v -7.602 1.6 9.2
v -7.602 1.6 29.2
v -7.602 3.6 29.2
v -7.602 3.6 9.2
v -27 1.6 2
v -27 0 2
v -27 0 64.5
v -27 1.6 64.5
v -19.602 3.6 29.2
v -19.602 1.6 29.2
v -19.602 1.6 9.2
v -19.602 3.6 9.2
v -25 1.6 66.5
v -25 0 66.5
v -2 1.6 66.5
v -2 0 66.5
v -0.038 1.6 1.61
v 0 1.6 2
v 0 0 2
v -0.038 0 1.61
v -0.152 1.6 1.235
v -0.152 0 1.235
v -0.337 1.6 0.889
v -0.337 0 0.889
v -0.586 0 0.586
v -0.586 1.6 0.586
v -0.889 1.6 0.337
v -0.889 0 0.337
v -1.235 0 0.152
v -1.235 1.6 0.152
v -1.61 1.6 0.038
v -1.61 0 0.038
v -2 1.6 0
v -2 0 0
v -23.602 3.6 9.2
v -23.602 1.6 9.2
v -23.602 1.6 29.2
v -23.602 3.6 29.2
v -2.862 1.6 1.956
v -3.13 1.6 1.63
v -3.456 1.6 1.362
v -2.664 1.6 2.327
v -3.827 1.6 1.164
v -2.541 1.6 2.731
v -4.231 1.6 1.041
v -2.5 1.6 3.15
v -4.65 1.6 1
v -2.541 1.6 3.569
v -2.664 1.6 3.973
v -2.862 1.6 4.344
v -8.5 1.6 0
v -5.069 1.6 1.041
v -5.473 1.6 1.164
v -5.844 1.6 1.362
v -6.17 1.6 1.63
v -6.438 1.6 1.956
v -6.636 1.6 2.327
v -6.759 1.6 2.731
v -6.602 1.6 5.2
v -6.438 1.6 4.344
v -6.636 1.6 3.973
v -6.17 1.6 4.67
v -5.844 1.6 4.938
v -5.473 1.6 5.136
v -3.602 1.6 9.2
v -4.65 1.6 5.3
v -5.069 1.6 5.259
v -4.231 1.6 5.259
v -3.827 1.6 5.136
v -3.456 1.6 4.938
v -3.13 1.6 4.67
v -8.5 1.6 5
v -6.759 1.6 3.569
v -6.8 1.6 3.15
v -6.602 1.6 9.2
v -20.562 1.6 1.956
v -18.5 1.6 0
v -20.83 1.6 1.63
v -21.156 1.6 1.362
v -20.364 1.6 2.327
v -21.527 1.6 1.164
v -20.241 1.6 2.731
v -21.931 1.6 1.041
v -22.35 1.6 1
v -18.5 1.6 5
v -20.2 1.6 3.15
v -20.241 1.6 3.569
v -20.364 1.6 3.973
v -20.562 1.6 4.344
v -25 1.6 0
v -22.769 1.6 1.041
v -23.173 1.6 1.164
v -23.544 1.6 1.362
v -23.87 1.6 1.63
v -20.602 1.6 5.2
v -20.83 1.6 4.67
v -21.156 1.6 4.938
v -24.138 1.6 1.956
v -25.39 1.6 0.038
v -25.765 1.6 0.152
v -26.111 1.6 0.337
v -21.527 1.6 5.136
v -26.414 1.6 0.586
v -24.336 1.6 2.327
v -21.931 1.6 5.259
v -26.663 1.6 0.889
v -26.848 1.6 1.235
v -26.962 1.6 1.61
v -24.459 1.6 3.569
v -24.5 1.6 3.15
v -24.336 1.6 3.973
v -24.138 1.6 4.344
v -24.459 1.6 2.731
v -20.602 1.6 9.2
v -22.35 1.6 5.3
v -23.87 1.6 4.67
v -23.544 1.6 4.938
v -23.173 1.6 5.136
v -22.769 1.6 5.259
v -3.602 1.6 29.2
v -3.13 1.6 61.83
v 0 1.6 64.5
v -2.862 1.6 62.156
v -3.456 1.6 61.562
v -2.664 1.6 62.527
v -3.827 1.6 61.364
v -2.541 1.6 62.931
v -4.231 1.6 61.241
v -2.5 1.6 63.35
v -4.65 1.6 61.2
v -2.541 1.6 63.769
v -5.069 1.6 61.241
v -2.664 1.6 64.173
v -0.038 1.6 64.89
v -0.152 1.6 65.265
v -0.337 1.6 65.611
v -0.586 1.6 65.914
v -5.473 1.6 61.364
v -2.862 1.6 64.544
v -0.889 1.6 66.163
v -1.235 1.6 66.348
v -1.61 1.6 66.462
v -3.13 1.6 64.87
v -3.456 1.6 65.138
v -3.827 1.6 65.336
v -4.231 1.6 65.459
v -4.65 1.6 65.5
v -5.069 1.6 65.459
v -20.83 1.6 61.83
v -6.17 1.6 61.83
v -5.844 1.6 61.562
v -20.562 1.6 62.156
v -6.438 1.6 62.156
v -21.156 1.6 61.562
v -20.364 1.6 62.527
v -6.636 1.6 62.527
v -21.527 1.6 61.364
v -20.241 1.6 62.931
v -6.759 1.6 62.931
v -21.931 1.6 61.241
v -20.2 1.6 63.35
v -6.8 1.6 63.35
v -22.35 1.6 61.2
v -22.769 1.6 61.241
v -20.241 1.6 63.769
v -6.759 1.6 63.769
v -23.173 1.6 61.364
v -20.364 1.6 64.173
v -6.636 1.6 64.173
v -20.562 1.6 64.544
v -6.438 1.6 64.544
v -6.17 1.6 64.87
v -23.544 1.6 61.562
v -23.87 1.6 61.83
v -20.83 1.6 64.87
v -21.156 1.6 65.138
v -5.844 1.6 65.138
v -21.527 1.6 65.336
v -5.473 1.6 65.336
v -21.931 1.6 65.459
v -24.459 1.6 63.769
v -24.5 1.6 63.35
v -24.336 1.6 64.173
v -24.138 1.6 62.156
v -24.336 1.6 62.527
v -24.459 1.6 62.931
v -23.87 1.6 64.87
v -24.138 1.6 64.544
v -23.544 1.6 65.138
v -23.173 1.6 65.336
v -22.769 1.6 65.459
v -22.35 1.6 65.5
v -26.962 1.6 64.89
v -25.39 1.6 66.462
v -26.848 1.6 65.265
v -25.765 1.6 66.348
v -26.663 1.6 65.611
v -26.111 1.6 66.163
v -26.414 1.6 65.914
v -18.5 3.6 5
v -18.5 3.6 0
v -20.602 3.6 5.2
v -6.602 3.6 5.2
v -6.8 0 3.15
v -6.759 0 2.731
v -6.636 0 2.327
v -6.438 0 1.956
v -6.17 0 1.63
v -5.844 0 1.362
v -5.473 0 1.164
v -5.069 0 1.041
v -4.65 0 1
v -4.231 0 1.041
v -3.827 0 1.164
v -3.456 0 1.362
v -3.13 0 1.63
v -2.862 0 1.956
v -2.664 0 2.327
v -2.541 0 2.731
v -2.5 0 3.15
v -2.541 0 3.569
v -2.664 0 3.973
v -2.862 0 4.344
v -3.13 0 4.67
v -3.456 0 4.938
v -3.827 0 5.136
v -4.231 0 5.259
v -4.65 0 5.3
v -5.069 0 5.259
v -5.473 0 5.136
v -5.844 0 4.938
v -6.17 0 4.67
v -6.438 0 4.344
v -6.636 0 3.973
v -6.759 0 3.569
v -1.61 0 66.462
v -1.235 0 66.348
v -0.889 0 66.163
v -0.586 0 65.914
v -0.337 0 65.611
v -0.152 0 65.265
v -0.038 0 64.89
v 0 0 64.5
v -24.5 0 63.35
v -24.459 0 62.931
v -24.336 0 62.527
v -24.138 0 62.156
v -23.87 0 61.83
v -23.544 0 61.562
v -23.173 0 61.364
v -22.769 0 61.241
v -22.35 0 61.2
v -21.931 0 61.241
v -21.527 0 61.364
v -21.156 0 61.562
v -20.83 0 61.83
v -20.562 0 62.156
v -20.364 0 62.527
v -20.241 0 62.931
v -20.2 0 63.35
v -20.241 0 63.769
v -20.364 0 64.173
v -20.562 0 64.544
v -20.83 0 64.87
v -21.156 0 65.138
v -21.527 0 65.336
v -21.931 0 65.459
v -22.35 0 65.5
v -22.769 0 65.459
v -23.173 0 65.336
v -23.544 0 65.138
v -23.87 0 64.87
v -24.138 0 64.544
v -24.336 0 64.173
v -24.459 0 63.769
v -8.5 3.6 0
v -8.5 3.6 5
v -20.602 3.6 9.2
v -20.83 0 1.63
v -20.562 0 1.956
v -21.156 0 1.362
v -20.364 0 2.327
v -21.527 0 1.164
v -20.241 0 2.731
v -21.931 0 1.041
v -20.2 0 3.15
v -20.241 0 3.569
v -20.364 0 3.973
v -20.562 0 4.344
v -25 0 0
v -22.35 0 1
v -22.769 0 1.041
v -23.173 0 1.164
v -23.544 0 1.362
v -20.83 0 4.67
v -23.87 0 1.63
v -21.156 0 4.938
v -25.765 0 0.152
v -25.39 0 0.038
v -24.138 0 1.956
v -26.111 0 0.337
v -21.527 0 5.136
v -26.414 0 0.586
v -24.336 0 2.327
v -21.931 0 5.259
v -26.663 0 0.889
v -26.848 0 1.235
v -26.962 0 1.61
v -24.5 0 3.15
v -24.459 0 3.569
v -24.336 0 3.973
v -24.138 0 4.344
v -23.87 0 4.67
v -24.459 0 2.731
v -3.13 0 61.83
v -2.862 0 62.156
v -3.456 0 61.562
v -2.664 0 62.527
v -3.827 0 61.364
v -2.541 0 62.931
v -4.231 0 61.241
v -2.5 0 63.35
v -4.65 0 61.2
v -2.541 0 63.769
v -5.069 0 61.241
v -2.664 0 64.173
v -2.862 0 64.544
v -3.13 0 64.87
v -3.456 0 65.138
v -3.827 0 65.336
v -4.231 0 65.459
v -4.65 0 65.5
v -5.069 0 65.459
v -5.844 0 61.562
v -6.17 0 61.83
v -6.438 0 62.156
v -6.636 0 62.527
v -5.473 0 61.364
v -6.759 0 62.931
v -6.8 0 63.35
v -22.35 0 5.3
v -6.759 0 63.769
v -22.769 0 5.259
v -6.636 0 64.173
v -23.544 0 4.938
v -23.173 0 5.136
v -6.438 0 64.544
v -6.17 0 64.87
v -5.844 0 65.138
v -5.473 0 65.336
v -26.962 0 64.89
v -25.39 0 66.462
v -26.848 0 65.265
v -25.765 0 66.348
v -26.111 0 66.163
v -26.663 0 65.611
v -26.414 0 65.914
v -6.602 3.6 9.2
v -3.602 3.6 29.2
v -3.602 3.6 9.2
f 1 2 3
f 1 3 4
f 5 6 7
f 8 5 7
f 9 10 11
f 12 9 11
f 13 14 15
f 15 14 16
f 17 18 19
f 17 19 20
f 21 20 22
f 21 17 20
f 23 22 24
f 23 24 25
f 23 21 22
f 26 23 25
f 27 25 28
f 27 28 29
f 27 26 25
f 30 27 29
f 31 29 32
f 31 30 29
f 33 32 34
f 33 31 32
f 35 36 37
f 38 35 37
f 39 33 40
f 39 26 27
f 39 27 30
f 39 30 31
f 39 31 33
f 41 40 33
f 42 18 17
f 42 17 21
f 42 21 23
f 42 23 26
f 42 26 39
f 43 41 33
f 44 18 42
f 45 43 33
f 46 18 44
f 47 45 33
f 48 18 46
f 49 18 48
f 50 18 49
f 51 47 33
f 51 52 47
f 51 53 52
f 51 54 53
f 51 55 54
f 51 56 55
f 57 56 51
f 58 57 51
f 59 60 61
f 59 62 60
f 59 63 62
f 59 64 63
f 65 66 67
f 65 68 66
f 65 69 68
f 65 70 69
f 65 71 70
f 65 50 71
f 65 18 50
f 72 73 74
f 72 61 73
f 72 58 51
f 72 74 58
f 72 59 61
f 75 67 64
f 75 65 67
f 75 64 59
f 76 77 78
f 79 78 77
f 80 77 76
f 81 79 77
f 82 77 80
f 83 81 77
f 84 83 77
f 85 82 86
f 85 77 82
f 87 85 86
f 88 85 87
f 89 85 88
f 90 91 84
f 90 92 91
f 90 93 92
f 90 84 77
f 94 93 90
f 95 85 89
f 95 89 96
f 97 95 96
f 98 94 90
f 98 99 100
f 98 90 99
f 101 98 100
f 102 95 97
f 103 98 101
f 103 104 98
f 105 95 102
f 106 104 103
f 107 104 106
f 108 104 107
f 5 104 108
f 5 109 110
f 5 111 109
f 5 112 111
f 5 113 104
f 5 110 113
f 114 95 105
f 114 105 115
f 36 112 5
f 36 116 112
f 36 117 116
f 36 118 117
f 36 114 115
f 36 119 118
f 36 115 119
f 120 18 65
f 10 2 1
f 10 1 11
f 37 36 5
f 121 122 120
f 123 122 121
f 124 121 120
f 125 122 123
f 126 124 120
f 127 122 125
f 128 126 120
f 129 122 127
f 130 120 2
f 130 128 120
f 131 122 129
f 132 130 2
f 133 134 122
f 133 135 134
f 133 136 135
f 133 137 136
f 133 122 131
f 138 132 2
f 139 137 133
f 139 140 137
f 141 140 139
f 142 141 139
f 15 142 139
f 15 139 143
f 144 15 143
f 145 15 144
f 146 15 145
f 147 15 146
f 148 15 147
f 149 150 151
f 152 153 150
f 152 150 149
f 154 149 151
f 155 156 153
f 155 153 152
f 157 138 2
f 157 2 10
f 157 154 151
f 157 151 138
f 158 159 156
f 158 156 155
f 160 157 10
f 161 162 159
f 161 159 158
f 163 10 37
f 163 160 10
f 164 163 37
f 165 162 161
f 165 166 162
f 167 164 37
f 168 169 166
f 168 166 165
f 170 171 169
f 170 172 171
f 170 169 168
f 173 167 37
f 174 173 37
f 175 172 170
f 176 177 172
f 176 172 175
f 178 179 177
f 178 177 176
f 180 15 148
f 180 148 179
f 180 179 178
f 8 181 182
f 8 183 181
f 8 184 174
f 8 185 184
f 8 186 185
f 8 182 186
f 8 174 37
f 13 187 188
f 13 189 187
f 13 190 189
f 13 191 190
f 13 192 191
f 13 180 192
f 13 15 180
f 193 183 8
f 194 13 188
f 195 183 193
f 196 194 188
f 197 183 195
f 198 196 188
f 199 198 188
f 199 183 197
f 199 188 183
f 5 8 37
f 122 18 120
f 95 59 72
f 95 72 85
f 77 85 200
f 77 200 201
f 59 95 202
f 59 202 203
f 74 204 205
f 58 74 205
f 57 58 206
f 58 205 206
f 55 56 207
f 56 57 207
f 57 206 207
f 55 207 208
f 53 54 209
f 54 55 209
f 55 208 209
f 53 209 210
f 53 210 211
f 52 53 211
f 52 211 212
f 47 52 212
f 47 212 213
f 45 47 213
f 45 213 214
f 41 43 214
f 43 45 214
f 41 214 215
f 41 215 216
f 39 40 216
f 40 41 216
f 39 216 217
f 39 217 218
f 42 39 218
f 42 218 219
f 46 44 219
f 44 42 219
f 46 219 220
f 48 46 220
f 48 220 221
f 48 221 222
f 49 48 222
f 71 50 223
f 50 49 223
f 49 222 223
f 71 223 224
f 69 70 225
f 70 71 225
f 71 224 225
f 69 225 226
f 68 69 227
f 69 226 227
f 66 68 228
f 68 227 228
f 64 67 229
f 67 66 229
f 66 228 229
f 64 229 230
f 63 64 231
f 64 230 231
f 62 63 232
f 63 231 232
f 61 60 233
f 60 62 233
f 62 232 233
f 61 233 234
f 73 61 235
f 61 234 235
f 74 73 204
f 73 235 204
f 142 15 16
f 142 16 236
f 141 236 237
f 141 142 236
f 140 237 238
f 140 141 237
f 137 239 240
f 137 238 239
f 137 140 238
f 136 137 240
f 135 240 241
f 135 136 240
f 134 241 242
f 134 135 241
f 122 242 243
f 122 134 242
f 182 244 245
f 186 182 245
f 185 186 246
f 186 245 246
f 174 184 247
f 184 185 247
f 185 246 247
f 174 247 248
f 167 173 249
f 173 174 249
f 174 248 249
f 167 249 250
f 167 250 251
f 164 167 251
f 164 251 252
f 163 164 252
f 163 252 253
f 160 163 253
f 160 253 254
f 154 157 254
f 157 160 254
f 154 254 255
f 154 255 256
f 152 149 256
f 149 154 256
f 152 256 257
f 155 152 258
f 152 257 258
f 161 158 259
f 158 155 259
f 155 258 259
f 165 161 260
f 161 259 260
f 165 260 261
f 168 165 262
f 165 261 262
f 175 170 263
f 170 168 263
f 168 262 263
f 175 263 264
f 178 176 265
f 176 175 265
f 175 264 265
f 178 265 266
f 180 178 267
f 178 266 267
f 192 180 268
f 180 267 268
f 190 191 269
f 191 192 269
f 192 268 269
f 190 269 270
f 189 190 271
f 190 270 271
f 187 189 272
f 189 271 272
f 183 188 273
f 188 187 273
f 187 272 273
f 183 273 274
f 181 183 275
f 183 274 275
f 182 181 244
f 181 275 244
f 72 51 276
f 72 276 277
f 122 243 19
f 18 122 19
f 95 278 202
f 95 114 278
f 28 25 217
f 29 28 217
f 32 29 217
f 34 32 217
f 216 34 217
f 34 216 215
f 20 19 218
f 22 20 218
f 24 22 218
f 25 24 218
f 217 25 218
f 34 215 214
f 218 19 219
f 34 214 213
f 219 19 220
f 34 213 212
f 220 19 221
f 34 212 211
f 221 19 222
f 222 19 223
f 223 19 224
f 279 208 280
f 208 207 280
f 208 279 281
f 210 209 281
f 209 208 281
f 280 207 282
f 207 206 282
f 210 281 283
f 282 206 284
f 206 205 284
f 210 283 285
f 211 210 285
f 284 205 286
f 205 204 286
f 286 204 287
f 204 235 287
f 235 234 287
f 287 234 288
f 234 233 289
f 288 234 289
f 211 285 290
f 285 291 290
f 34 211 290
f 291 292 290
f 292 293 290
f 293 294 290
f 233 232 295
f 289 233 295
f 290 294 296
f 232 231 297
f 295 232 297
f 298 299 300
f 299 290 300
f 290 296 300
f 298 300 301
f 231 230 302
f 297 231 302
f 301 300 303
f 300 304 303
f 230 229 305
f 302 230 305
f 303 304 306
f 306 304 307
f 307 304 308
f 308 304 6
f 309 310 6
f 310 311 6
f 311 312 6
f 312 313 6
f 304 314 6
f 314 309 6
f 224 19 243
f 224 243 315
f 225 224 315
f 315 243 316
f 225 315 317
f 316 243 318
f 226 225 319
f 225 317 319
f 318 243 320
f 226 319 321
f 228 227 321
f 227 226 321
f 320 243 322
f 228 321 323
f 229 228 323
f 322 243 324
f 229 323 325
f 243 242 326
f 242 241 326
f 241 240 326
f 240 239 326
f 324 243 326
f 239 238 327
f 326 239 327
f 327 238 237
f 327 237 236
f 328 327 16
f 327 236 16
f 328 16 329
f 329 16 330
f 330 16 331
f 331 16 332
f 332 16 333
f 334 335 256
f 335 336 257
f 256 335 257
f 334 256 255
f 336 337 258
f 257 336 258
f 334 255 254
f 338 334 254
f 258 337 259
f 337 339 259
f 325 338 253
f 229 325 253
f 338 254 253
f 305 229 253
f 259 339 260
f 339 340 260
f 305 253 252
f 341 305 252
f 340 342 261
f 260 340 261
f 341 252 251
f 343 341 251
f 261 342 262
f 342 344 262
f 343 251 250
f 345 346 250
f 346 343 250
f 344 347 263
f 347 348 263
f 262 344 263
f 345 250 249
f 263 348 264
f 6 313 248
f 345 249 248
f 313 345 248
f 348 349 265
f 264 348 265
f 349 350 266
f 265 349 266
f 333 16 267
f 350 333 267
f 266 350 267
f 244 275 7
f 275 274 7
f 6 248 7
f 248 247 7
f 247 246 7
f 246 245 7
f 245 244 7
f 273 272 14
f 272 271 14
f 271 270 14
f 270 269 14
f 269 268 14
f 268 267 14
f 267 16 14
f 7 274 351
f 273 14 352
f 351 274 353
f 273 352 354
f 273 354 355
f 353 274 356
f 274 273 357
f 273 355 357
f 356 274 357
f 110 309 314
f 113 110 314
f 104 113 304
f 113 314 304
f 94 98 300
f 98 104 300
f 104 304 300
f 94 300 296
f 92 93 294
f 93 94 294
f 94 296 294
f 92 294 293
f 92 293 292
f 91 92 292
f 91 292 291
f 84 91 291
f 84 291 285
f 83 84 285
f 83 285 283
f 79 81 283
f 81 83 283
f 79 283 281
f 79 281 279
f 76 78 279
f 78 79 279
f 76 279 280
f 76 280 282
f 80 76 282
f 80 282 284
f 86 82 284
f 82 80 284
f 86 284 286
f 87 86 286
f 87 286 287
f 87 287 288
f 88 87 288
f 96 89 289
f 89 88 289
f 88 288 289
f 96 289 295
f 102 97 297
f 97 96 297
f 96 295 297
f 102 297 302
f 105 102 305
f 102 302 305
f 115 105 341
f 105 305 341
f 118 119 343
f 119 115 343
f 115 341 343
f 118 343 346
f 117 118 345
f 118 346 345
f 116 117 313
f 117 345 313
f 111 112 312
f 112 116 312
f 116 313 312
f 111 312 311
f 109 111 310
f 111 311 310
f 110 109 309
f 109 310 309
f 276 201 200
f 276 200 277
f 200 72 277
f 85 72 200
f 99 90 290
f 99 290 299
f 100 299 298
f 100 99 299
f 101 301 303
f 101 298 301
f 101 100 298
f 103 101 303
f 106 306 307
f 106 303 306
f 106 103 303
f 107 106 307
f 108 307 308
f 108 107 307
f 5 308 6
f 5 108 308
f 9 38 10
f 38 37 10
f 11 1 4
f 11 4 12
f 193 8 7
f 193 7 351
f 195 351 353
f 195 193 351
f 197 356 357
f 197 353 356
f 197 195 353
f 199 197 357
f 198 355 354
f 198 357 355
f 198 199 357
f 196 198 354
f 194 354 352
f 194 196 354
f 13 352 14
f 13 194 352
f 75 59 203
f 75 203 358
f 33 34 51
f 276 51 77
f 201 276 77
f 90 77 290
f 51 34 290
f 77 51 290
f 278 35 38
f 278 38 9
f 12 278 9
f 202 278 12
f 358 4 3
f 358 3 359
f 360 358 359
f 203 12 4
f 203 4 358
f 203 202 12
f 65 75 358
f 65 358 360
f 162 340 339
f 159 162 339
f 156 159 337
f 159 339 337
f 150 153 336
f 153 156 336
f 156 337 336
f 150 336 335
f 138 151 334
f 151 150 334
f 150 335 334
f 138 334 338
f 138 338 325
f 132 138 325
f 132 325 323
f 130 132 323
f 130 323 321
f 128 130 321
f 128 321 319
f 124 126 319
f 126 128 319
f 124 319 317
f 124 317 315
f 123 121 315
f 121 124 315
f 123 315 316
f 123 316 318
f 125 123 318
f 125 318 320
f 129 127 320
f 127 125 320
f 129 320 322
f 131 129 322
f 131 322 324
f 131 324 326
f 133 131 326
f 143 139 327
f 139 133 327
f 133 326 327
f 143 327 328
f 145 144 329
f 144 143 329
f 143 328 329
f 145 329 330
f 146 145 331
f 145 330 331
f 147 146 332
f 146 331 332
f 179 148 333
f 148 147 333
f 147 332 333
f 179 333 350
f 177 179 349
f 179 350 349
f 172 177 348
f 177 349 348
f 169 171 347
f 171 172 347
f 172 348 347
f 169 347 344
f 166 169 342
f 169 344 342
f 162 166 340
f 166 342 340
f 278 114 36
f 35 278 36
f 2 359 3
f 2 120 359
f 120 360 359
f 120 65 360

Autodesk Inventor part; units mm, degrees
ref_plane "YZ Plane" through (0, 0, 0) normal (1, 0, 0) x (0, 1, 0)
ref_plane "XZ Plane" through (0, 0, 0) normal (0, 1, 0) x (-1, 0, 0)
ref_plane "XY Plane" through (0, 0, 0) normal (0, 0, 1) x (1, 0, 0)
sketch "Esquisse1" plane through (0, 0, 0) normal (0, 1, 0) x (-1, 0, 0)
  line L0 (0, 0) -> (27, 0)
  line L1 (27, 0) -> (27, 66.5)
  line L2 (27, 66.5) -> (0, 66.5)
  line L3 (0, 66.5) -> (0, 0)
  line L4 (4.65, 63.35) -> (22.35, 63.35) construction
  line L5 (22.35, 63.35) -> (22.35, 3.15) construction
  line L6 (22.35, 3.15) -> (4.65, 3.15) construction
  line L7 (4.65, 3.15) -> (4.65, 63.35) construction
  line L8 (13.5, 63.35) -> (13.5, 66.5) construction
  line L9 (22.35, 33.25) -> (27, 33.25) construction
  line L10 (4.65, 33.25) -> (0, 33.25) construction
  line L11 (13.5, 3.15) -> (13.5, 0) construction
  circle A0 centre (4.65, 63.35) radius 2.15
  circle A1 centre (22.35, 63.35) radius 2.15
  circle A2 centre (4.65, 3.15) radius 2.15
  circle A3 centre (22.35, 3.15) radius 2.15
  dimension "d0" = 27
  dimension "d1" = 66.5
  dimension "d2" = 60.2
  dimension "d3" = 17.7
  dimension "d4" = 4.3
extrude "Extrusion1" add sketch "Esquisse1" along normal blind 1.6
fillet "Congé1" radius 2 4 edges at (0, 0.8, 0) (-27, 0.8, 0) (0, 0.8, 66.5) (-27, 0.8, 66.5)
sketch "Esquisse2" plane through (0, 1.6, 0) normal (0, 1, 0) x (1, 0, 0)
  line L0 (-2, 0) -> (-25, 0) construction
  line L1 (-18.5, 0) -> (-8.5, 0)
  line L2 (-8.5, 0) -> (-8.5, -5)
  line L3 (-8.5, -5) -> (-18.5, -5)
  line L4 (-18.5, -5) -> (-18.5, 0)
  point P0 (0, 0)
  point P1 (-13.5, 0)
  dimension "d8" = 5
  dimension "d9" = 10
extrude "Extrusion2" add sketch "Esquisse2" along normal blind 2
sketch "Esquisse3" plane through (0, 1.6, 0) normal (0, 1, 0) x (1, 0, 0)
  line L0 (-6.6018, -5.2) -> (-6.6018, -9.2)
  line L1 (-6.6018, -9.2) -> (-20.6018, -9.2)
  line L2 (-20.6018, -9.2) -> (-20.6018, -5.2)
  line L3 (-18.5, -5) -> (-8.5, -5)
  line L4 (-17.7303, -5) -> (-13.5194, -5) construction
  line L5 (-13.6018, -9.2) -> (-13.6018, -29.6083) construction
  line L6 (-19.6018, -9.2) -> (-23.6018, -9.2)
  line L7 (-23.6018, -9.2) -> (-23.6018, -29.2)
  line L8 (-23.6018, -29.2) -> (-19.6018, -29.2)
  line L9 (-19.6018, -29.2) -> (-19.6018, -9.2)
  line L10 (-7.6018, -9.2) -> (-3.6018, -9.2)
  line L11 (-3.6018, -9.2) -> (-3.6018, -29.2)
  line L12 (-3.6018, -29.2) -> (-7.6018, -29.2)
  line L13 (-7.6018, -29.2) -> (-7.6018, -9.2)
  line L14 (-8.5, -5) -> (-18.5, -5)
  line L15 (-20.6018, -5.2) -> (-6.6018, -5.2)
  point P0 (0, 0)
  point P1 (-13.5, -5)
  dimension "d12" = 14
  dimension "d13" = 4
  dimension "d14" = 20
  dimension "d15" = 4
  dimension "d16" = 12
  dimension "d19" = 0.2
extrude "Extrusion3" add sketch "Esquisse3" along normal blind 2
properties part number "opencm"
